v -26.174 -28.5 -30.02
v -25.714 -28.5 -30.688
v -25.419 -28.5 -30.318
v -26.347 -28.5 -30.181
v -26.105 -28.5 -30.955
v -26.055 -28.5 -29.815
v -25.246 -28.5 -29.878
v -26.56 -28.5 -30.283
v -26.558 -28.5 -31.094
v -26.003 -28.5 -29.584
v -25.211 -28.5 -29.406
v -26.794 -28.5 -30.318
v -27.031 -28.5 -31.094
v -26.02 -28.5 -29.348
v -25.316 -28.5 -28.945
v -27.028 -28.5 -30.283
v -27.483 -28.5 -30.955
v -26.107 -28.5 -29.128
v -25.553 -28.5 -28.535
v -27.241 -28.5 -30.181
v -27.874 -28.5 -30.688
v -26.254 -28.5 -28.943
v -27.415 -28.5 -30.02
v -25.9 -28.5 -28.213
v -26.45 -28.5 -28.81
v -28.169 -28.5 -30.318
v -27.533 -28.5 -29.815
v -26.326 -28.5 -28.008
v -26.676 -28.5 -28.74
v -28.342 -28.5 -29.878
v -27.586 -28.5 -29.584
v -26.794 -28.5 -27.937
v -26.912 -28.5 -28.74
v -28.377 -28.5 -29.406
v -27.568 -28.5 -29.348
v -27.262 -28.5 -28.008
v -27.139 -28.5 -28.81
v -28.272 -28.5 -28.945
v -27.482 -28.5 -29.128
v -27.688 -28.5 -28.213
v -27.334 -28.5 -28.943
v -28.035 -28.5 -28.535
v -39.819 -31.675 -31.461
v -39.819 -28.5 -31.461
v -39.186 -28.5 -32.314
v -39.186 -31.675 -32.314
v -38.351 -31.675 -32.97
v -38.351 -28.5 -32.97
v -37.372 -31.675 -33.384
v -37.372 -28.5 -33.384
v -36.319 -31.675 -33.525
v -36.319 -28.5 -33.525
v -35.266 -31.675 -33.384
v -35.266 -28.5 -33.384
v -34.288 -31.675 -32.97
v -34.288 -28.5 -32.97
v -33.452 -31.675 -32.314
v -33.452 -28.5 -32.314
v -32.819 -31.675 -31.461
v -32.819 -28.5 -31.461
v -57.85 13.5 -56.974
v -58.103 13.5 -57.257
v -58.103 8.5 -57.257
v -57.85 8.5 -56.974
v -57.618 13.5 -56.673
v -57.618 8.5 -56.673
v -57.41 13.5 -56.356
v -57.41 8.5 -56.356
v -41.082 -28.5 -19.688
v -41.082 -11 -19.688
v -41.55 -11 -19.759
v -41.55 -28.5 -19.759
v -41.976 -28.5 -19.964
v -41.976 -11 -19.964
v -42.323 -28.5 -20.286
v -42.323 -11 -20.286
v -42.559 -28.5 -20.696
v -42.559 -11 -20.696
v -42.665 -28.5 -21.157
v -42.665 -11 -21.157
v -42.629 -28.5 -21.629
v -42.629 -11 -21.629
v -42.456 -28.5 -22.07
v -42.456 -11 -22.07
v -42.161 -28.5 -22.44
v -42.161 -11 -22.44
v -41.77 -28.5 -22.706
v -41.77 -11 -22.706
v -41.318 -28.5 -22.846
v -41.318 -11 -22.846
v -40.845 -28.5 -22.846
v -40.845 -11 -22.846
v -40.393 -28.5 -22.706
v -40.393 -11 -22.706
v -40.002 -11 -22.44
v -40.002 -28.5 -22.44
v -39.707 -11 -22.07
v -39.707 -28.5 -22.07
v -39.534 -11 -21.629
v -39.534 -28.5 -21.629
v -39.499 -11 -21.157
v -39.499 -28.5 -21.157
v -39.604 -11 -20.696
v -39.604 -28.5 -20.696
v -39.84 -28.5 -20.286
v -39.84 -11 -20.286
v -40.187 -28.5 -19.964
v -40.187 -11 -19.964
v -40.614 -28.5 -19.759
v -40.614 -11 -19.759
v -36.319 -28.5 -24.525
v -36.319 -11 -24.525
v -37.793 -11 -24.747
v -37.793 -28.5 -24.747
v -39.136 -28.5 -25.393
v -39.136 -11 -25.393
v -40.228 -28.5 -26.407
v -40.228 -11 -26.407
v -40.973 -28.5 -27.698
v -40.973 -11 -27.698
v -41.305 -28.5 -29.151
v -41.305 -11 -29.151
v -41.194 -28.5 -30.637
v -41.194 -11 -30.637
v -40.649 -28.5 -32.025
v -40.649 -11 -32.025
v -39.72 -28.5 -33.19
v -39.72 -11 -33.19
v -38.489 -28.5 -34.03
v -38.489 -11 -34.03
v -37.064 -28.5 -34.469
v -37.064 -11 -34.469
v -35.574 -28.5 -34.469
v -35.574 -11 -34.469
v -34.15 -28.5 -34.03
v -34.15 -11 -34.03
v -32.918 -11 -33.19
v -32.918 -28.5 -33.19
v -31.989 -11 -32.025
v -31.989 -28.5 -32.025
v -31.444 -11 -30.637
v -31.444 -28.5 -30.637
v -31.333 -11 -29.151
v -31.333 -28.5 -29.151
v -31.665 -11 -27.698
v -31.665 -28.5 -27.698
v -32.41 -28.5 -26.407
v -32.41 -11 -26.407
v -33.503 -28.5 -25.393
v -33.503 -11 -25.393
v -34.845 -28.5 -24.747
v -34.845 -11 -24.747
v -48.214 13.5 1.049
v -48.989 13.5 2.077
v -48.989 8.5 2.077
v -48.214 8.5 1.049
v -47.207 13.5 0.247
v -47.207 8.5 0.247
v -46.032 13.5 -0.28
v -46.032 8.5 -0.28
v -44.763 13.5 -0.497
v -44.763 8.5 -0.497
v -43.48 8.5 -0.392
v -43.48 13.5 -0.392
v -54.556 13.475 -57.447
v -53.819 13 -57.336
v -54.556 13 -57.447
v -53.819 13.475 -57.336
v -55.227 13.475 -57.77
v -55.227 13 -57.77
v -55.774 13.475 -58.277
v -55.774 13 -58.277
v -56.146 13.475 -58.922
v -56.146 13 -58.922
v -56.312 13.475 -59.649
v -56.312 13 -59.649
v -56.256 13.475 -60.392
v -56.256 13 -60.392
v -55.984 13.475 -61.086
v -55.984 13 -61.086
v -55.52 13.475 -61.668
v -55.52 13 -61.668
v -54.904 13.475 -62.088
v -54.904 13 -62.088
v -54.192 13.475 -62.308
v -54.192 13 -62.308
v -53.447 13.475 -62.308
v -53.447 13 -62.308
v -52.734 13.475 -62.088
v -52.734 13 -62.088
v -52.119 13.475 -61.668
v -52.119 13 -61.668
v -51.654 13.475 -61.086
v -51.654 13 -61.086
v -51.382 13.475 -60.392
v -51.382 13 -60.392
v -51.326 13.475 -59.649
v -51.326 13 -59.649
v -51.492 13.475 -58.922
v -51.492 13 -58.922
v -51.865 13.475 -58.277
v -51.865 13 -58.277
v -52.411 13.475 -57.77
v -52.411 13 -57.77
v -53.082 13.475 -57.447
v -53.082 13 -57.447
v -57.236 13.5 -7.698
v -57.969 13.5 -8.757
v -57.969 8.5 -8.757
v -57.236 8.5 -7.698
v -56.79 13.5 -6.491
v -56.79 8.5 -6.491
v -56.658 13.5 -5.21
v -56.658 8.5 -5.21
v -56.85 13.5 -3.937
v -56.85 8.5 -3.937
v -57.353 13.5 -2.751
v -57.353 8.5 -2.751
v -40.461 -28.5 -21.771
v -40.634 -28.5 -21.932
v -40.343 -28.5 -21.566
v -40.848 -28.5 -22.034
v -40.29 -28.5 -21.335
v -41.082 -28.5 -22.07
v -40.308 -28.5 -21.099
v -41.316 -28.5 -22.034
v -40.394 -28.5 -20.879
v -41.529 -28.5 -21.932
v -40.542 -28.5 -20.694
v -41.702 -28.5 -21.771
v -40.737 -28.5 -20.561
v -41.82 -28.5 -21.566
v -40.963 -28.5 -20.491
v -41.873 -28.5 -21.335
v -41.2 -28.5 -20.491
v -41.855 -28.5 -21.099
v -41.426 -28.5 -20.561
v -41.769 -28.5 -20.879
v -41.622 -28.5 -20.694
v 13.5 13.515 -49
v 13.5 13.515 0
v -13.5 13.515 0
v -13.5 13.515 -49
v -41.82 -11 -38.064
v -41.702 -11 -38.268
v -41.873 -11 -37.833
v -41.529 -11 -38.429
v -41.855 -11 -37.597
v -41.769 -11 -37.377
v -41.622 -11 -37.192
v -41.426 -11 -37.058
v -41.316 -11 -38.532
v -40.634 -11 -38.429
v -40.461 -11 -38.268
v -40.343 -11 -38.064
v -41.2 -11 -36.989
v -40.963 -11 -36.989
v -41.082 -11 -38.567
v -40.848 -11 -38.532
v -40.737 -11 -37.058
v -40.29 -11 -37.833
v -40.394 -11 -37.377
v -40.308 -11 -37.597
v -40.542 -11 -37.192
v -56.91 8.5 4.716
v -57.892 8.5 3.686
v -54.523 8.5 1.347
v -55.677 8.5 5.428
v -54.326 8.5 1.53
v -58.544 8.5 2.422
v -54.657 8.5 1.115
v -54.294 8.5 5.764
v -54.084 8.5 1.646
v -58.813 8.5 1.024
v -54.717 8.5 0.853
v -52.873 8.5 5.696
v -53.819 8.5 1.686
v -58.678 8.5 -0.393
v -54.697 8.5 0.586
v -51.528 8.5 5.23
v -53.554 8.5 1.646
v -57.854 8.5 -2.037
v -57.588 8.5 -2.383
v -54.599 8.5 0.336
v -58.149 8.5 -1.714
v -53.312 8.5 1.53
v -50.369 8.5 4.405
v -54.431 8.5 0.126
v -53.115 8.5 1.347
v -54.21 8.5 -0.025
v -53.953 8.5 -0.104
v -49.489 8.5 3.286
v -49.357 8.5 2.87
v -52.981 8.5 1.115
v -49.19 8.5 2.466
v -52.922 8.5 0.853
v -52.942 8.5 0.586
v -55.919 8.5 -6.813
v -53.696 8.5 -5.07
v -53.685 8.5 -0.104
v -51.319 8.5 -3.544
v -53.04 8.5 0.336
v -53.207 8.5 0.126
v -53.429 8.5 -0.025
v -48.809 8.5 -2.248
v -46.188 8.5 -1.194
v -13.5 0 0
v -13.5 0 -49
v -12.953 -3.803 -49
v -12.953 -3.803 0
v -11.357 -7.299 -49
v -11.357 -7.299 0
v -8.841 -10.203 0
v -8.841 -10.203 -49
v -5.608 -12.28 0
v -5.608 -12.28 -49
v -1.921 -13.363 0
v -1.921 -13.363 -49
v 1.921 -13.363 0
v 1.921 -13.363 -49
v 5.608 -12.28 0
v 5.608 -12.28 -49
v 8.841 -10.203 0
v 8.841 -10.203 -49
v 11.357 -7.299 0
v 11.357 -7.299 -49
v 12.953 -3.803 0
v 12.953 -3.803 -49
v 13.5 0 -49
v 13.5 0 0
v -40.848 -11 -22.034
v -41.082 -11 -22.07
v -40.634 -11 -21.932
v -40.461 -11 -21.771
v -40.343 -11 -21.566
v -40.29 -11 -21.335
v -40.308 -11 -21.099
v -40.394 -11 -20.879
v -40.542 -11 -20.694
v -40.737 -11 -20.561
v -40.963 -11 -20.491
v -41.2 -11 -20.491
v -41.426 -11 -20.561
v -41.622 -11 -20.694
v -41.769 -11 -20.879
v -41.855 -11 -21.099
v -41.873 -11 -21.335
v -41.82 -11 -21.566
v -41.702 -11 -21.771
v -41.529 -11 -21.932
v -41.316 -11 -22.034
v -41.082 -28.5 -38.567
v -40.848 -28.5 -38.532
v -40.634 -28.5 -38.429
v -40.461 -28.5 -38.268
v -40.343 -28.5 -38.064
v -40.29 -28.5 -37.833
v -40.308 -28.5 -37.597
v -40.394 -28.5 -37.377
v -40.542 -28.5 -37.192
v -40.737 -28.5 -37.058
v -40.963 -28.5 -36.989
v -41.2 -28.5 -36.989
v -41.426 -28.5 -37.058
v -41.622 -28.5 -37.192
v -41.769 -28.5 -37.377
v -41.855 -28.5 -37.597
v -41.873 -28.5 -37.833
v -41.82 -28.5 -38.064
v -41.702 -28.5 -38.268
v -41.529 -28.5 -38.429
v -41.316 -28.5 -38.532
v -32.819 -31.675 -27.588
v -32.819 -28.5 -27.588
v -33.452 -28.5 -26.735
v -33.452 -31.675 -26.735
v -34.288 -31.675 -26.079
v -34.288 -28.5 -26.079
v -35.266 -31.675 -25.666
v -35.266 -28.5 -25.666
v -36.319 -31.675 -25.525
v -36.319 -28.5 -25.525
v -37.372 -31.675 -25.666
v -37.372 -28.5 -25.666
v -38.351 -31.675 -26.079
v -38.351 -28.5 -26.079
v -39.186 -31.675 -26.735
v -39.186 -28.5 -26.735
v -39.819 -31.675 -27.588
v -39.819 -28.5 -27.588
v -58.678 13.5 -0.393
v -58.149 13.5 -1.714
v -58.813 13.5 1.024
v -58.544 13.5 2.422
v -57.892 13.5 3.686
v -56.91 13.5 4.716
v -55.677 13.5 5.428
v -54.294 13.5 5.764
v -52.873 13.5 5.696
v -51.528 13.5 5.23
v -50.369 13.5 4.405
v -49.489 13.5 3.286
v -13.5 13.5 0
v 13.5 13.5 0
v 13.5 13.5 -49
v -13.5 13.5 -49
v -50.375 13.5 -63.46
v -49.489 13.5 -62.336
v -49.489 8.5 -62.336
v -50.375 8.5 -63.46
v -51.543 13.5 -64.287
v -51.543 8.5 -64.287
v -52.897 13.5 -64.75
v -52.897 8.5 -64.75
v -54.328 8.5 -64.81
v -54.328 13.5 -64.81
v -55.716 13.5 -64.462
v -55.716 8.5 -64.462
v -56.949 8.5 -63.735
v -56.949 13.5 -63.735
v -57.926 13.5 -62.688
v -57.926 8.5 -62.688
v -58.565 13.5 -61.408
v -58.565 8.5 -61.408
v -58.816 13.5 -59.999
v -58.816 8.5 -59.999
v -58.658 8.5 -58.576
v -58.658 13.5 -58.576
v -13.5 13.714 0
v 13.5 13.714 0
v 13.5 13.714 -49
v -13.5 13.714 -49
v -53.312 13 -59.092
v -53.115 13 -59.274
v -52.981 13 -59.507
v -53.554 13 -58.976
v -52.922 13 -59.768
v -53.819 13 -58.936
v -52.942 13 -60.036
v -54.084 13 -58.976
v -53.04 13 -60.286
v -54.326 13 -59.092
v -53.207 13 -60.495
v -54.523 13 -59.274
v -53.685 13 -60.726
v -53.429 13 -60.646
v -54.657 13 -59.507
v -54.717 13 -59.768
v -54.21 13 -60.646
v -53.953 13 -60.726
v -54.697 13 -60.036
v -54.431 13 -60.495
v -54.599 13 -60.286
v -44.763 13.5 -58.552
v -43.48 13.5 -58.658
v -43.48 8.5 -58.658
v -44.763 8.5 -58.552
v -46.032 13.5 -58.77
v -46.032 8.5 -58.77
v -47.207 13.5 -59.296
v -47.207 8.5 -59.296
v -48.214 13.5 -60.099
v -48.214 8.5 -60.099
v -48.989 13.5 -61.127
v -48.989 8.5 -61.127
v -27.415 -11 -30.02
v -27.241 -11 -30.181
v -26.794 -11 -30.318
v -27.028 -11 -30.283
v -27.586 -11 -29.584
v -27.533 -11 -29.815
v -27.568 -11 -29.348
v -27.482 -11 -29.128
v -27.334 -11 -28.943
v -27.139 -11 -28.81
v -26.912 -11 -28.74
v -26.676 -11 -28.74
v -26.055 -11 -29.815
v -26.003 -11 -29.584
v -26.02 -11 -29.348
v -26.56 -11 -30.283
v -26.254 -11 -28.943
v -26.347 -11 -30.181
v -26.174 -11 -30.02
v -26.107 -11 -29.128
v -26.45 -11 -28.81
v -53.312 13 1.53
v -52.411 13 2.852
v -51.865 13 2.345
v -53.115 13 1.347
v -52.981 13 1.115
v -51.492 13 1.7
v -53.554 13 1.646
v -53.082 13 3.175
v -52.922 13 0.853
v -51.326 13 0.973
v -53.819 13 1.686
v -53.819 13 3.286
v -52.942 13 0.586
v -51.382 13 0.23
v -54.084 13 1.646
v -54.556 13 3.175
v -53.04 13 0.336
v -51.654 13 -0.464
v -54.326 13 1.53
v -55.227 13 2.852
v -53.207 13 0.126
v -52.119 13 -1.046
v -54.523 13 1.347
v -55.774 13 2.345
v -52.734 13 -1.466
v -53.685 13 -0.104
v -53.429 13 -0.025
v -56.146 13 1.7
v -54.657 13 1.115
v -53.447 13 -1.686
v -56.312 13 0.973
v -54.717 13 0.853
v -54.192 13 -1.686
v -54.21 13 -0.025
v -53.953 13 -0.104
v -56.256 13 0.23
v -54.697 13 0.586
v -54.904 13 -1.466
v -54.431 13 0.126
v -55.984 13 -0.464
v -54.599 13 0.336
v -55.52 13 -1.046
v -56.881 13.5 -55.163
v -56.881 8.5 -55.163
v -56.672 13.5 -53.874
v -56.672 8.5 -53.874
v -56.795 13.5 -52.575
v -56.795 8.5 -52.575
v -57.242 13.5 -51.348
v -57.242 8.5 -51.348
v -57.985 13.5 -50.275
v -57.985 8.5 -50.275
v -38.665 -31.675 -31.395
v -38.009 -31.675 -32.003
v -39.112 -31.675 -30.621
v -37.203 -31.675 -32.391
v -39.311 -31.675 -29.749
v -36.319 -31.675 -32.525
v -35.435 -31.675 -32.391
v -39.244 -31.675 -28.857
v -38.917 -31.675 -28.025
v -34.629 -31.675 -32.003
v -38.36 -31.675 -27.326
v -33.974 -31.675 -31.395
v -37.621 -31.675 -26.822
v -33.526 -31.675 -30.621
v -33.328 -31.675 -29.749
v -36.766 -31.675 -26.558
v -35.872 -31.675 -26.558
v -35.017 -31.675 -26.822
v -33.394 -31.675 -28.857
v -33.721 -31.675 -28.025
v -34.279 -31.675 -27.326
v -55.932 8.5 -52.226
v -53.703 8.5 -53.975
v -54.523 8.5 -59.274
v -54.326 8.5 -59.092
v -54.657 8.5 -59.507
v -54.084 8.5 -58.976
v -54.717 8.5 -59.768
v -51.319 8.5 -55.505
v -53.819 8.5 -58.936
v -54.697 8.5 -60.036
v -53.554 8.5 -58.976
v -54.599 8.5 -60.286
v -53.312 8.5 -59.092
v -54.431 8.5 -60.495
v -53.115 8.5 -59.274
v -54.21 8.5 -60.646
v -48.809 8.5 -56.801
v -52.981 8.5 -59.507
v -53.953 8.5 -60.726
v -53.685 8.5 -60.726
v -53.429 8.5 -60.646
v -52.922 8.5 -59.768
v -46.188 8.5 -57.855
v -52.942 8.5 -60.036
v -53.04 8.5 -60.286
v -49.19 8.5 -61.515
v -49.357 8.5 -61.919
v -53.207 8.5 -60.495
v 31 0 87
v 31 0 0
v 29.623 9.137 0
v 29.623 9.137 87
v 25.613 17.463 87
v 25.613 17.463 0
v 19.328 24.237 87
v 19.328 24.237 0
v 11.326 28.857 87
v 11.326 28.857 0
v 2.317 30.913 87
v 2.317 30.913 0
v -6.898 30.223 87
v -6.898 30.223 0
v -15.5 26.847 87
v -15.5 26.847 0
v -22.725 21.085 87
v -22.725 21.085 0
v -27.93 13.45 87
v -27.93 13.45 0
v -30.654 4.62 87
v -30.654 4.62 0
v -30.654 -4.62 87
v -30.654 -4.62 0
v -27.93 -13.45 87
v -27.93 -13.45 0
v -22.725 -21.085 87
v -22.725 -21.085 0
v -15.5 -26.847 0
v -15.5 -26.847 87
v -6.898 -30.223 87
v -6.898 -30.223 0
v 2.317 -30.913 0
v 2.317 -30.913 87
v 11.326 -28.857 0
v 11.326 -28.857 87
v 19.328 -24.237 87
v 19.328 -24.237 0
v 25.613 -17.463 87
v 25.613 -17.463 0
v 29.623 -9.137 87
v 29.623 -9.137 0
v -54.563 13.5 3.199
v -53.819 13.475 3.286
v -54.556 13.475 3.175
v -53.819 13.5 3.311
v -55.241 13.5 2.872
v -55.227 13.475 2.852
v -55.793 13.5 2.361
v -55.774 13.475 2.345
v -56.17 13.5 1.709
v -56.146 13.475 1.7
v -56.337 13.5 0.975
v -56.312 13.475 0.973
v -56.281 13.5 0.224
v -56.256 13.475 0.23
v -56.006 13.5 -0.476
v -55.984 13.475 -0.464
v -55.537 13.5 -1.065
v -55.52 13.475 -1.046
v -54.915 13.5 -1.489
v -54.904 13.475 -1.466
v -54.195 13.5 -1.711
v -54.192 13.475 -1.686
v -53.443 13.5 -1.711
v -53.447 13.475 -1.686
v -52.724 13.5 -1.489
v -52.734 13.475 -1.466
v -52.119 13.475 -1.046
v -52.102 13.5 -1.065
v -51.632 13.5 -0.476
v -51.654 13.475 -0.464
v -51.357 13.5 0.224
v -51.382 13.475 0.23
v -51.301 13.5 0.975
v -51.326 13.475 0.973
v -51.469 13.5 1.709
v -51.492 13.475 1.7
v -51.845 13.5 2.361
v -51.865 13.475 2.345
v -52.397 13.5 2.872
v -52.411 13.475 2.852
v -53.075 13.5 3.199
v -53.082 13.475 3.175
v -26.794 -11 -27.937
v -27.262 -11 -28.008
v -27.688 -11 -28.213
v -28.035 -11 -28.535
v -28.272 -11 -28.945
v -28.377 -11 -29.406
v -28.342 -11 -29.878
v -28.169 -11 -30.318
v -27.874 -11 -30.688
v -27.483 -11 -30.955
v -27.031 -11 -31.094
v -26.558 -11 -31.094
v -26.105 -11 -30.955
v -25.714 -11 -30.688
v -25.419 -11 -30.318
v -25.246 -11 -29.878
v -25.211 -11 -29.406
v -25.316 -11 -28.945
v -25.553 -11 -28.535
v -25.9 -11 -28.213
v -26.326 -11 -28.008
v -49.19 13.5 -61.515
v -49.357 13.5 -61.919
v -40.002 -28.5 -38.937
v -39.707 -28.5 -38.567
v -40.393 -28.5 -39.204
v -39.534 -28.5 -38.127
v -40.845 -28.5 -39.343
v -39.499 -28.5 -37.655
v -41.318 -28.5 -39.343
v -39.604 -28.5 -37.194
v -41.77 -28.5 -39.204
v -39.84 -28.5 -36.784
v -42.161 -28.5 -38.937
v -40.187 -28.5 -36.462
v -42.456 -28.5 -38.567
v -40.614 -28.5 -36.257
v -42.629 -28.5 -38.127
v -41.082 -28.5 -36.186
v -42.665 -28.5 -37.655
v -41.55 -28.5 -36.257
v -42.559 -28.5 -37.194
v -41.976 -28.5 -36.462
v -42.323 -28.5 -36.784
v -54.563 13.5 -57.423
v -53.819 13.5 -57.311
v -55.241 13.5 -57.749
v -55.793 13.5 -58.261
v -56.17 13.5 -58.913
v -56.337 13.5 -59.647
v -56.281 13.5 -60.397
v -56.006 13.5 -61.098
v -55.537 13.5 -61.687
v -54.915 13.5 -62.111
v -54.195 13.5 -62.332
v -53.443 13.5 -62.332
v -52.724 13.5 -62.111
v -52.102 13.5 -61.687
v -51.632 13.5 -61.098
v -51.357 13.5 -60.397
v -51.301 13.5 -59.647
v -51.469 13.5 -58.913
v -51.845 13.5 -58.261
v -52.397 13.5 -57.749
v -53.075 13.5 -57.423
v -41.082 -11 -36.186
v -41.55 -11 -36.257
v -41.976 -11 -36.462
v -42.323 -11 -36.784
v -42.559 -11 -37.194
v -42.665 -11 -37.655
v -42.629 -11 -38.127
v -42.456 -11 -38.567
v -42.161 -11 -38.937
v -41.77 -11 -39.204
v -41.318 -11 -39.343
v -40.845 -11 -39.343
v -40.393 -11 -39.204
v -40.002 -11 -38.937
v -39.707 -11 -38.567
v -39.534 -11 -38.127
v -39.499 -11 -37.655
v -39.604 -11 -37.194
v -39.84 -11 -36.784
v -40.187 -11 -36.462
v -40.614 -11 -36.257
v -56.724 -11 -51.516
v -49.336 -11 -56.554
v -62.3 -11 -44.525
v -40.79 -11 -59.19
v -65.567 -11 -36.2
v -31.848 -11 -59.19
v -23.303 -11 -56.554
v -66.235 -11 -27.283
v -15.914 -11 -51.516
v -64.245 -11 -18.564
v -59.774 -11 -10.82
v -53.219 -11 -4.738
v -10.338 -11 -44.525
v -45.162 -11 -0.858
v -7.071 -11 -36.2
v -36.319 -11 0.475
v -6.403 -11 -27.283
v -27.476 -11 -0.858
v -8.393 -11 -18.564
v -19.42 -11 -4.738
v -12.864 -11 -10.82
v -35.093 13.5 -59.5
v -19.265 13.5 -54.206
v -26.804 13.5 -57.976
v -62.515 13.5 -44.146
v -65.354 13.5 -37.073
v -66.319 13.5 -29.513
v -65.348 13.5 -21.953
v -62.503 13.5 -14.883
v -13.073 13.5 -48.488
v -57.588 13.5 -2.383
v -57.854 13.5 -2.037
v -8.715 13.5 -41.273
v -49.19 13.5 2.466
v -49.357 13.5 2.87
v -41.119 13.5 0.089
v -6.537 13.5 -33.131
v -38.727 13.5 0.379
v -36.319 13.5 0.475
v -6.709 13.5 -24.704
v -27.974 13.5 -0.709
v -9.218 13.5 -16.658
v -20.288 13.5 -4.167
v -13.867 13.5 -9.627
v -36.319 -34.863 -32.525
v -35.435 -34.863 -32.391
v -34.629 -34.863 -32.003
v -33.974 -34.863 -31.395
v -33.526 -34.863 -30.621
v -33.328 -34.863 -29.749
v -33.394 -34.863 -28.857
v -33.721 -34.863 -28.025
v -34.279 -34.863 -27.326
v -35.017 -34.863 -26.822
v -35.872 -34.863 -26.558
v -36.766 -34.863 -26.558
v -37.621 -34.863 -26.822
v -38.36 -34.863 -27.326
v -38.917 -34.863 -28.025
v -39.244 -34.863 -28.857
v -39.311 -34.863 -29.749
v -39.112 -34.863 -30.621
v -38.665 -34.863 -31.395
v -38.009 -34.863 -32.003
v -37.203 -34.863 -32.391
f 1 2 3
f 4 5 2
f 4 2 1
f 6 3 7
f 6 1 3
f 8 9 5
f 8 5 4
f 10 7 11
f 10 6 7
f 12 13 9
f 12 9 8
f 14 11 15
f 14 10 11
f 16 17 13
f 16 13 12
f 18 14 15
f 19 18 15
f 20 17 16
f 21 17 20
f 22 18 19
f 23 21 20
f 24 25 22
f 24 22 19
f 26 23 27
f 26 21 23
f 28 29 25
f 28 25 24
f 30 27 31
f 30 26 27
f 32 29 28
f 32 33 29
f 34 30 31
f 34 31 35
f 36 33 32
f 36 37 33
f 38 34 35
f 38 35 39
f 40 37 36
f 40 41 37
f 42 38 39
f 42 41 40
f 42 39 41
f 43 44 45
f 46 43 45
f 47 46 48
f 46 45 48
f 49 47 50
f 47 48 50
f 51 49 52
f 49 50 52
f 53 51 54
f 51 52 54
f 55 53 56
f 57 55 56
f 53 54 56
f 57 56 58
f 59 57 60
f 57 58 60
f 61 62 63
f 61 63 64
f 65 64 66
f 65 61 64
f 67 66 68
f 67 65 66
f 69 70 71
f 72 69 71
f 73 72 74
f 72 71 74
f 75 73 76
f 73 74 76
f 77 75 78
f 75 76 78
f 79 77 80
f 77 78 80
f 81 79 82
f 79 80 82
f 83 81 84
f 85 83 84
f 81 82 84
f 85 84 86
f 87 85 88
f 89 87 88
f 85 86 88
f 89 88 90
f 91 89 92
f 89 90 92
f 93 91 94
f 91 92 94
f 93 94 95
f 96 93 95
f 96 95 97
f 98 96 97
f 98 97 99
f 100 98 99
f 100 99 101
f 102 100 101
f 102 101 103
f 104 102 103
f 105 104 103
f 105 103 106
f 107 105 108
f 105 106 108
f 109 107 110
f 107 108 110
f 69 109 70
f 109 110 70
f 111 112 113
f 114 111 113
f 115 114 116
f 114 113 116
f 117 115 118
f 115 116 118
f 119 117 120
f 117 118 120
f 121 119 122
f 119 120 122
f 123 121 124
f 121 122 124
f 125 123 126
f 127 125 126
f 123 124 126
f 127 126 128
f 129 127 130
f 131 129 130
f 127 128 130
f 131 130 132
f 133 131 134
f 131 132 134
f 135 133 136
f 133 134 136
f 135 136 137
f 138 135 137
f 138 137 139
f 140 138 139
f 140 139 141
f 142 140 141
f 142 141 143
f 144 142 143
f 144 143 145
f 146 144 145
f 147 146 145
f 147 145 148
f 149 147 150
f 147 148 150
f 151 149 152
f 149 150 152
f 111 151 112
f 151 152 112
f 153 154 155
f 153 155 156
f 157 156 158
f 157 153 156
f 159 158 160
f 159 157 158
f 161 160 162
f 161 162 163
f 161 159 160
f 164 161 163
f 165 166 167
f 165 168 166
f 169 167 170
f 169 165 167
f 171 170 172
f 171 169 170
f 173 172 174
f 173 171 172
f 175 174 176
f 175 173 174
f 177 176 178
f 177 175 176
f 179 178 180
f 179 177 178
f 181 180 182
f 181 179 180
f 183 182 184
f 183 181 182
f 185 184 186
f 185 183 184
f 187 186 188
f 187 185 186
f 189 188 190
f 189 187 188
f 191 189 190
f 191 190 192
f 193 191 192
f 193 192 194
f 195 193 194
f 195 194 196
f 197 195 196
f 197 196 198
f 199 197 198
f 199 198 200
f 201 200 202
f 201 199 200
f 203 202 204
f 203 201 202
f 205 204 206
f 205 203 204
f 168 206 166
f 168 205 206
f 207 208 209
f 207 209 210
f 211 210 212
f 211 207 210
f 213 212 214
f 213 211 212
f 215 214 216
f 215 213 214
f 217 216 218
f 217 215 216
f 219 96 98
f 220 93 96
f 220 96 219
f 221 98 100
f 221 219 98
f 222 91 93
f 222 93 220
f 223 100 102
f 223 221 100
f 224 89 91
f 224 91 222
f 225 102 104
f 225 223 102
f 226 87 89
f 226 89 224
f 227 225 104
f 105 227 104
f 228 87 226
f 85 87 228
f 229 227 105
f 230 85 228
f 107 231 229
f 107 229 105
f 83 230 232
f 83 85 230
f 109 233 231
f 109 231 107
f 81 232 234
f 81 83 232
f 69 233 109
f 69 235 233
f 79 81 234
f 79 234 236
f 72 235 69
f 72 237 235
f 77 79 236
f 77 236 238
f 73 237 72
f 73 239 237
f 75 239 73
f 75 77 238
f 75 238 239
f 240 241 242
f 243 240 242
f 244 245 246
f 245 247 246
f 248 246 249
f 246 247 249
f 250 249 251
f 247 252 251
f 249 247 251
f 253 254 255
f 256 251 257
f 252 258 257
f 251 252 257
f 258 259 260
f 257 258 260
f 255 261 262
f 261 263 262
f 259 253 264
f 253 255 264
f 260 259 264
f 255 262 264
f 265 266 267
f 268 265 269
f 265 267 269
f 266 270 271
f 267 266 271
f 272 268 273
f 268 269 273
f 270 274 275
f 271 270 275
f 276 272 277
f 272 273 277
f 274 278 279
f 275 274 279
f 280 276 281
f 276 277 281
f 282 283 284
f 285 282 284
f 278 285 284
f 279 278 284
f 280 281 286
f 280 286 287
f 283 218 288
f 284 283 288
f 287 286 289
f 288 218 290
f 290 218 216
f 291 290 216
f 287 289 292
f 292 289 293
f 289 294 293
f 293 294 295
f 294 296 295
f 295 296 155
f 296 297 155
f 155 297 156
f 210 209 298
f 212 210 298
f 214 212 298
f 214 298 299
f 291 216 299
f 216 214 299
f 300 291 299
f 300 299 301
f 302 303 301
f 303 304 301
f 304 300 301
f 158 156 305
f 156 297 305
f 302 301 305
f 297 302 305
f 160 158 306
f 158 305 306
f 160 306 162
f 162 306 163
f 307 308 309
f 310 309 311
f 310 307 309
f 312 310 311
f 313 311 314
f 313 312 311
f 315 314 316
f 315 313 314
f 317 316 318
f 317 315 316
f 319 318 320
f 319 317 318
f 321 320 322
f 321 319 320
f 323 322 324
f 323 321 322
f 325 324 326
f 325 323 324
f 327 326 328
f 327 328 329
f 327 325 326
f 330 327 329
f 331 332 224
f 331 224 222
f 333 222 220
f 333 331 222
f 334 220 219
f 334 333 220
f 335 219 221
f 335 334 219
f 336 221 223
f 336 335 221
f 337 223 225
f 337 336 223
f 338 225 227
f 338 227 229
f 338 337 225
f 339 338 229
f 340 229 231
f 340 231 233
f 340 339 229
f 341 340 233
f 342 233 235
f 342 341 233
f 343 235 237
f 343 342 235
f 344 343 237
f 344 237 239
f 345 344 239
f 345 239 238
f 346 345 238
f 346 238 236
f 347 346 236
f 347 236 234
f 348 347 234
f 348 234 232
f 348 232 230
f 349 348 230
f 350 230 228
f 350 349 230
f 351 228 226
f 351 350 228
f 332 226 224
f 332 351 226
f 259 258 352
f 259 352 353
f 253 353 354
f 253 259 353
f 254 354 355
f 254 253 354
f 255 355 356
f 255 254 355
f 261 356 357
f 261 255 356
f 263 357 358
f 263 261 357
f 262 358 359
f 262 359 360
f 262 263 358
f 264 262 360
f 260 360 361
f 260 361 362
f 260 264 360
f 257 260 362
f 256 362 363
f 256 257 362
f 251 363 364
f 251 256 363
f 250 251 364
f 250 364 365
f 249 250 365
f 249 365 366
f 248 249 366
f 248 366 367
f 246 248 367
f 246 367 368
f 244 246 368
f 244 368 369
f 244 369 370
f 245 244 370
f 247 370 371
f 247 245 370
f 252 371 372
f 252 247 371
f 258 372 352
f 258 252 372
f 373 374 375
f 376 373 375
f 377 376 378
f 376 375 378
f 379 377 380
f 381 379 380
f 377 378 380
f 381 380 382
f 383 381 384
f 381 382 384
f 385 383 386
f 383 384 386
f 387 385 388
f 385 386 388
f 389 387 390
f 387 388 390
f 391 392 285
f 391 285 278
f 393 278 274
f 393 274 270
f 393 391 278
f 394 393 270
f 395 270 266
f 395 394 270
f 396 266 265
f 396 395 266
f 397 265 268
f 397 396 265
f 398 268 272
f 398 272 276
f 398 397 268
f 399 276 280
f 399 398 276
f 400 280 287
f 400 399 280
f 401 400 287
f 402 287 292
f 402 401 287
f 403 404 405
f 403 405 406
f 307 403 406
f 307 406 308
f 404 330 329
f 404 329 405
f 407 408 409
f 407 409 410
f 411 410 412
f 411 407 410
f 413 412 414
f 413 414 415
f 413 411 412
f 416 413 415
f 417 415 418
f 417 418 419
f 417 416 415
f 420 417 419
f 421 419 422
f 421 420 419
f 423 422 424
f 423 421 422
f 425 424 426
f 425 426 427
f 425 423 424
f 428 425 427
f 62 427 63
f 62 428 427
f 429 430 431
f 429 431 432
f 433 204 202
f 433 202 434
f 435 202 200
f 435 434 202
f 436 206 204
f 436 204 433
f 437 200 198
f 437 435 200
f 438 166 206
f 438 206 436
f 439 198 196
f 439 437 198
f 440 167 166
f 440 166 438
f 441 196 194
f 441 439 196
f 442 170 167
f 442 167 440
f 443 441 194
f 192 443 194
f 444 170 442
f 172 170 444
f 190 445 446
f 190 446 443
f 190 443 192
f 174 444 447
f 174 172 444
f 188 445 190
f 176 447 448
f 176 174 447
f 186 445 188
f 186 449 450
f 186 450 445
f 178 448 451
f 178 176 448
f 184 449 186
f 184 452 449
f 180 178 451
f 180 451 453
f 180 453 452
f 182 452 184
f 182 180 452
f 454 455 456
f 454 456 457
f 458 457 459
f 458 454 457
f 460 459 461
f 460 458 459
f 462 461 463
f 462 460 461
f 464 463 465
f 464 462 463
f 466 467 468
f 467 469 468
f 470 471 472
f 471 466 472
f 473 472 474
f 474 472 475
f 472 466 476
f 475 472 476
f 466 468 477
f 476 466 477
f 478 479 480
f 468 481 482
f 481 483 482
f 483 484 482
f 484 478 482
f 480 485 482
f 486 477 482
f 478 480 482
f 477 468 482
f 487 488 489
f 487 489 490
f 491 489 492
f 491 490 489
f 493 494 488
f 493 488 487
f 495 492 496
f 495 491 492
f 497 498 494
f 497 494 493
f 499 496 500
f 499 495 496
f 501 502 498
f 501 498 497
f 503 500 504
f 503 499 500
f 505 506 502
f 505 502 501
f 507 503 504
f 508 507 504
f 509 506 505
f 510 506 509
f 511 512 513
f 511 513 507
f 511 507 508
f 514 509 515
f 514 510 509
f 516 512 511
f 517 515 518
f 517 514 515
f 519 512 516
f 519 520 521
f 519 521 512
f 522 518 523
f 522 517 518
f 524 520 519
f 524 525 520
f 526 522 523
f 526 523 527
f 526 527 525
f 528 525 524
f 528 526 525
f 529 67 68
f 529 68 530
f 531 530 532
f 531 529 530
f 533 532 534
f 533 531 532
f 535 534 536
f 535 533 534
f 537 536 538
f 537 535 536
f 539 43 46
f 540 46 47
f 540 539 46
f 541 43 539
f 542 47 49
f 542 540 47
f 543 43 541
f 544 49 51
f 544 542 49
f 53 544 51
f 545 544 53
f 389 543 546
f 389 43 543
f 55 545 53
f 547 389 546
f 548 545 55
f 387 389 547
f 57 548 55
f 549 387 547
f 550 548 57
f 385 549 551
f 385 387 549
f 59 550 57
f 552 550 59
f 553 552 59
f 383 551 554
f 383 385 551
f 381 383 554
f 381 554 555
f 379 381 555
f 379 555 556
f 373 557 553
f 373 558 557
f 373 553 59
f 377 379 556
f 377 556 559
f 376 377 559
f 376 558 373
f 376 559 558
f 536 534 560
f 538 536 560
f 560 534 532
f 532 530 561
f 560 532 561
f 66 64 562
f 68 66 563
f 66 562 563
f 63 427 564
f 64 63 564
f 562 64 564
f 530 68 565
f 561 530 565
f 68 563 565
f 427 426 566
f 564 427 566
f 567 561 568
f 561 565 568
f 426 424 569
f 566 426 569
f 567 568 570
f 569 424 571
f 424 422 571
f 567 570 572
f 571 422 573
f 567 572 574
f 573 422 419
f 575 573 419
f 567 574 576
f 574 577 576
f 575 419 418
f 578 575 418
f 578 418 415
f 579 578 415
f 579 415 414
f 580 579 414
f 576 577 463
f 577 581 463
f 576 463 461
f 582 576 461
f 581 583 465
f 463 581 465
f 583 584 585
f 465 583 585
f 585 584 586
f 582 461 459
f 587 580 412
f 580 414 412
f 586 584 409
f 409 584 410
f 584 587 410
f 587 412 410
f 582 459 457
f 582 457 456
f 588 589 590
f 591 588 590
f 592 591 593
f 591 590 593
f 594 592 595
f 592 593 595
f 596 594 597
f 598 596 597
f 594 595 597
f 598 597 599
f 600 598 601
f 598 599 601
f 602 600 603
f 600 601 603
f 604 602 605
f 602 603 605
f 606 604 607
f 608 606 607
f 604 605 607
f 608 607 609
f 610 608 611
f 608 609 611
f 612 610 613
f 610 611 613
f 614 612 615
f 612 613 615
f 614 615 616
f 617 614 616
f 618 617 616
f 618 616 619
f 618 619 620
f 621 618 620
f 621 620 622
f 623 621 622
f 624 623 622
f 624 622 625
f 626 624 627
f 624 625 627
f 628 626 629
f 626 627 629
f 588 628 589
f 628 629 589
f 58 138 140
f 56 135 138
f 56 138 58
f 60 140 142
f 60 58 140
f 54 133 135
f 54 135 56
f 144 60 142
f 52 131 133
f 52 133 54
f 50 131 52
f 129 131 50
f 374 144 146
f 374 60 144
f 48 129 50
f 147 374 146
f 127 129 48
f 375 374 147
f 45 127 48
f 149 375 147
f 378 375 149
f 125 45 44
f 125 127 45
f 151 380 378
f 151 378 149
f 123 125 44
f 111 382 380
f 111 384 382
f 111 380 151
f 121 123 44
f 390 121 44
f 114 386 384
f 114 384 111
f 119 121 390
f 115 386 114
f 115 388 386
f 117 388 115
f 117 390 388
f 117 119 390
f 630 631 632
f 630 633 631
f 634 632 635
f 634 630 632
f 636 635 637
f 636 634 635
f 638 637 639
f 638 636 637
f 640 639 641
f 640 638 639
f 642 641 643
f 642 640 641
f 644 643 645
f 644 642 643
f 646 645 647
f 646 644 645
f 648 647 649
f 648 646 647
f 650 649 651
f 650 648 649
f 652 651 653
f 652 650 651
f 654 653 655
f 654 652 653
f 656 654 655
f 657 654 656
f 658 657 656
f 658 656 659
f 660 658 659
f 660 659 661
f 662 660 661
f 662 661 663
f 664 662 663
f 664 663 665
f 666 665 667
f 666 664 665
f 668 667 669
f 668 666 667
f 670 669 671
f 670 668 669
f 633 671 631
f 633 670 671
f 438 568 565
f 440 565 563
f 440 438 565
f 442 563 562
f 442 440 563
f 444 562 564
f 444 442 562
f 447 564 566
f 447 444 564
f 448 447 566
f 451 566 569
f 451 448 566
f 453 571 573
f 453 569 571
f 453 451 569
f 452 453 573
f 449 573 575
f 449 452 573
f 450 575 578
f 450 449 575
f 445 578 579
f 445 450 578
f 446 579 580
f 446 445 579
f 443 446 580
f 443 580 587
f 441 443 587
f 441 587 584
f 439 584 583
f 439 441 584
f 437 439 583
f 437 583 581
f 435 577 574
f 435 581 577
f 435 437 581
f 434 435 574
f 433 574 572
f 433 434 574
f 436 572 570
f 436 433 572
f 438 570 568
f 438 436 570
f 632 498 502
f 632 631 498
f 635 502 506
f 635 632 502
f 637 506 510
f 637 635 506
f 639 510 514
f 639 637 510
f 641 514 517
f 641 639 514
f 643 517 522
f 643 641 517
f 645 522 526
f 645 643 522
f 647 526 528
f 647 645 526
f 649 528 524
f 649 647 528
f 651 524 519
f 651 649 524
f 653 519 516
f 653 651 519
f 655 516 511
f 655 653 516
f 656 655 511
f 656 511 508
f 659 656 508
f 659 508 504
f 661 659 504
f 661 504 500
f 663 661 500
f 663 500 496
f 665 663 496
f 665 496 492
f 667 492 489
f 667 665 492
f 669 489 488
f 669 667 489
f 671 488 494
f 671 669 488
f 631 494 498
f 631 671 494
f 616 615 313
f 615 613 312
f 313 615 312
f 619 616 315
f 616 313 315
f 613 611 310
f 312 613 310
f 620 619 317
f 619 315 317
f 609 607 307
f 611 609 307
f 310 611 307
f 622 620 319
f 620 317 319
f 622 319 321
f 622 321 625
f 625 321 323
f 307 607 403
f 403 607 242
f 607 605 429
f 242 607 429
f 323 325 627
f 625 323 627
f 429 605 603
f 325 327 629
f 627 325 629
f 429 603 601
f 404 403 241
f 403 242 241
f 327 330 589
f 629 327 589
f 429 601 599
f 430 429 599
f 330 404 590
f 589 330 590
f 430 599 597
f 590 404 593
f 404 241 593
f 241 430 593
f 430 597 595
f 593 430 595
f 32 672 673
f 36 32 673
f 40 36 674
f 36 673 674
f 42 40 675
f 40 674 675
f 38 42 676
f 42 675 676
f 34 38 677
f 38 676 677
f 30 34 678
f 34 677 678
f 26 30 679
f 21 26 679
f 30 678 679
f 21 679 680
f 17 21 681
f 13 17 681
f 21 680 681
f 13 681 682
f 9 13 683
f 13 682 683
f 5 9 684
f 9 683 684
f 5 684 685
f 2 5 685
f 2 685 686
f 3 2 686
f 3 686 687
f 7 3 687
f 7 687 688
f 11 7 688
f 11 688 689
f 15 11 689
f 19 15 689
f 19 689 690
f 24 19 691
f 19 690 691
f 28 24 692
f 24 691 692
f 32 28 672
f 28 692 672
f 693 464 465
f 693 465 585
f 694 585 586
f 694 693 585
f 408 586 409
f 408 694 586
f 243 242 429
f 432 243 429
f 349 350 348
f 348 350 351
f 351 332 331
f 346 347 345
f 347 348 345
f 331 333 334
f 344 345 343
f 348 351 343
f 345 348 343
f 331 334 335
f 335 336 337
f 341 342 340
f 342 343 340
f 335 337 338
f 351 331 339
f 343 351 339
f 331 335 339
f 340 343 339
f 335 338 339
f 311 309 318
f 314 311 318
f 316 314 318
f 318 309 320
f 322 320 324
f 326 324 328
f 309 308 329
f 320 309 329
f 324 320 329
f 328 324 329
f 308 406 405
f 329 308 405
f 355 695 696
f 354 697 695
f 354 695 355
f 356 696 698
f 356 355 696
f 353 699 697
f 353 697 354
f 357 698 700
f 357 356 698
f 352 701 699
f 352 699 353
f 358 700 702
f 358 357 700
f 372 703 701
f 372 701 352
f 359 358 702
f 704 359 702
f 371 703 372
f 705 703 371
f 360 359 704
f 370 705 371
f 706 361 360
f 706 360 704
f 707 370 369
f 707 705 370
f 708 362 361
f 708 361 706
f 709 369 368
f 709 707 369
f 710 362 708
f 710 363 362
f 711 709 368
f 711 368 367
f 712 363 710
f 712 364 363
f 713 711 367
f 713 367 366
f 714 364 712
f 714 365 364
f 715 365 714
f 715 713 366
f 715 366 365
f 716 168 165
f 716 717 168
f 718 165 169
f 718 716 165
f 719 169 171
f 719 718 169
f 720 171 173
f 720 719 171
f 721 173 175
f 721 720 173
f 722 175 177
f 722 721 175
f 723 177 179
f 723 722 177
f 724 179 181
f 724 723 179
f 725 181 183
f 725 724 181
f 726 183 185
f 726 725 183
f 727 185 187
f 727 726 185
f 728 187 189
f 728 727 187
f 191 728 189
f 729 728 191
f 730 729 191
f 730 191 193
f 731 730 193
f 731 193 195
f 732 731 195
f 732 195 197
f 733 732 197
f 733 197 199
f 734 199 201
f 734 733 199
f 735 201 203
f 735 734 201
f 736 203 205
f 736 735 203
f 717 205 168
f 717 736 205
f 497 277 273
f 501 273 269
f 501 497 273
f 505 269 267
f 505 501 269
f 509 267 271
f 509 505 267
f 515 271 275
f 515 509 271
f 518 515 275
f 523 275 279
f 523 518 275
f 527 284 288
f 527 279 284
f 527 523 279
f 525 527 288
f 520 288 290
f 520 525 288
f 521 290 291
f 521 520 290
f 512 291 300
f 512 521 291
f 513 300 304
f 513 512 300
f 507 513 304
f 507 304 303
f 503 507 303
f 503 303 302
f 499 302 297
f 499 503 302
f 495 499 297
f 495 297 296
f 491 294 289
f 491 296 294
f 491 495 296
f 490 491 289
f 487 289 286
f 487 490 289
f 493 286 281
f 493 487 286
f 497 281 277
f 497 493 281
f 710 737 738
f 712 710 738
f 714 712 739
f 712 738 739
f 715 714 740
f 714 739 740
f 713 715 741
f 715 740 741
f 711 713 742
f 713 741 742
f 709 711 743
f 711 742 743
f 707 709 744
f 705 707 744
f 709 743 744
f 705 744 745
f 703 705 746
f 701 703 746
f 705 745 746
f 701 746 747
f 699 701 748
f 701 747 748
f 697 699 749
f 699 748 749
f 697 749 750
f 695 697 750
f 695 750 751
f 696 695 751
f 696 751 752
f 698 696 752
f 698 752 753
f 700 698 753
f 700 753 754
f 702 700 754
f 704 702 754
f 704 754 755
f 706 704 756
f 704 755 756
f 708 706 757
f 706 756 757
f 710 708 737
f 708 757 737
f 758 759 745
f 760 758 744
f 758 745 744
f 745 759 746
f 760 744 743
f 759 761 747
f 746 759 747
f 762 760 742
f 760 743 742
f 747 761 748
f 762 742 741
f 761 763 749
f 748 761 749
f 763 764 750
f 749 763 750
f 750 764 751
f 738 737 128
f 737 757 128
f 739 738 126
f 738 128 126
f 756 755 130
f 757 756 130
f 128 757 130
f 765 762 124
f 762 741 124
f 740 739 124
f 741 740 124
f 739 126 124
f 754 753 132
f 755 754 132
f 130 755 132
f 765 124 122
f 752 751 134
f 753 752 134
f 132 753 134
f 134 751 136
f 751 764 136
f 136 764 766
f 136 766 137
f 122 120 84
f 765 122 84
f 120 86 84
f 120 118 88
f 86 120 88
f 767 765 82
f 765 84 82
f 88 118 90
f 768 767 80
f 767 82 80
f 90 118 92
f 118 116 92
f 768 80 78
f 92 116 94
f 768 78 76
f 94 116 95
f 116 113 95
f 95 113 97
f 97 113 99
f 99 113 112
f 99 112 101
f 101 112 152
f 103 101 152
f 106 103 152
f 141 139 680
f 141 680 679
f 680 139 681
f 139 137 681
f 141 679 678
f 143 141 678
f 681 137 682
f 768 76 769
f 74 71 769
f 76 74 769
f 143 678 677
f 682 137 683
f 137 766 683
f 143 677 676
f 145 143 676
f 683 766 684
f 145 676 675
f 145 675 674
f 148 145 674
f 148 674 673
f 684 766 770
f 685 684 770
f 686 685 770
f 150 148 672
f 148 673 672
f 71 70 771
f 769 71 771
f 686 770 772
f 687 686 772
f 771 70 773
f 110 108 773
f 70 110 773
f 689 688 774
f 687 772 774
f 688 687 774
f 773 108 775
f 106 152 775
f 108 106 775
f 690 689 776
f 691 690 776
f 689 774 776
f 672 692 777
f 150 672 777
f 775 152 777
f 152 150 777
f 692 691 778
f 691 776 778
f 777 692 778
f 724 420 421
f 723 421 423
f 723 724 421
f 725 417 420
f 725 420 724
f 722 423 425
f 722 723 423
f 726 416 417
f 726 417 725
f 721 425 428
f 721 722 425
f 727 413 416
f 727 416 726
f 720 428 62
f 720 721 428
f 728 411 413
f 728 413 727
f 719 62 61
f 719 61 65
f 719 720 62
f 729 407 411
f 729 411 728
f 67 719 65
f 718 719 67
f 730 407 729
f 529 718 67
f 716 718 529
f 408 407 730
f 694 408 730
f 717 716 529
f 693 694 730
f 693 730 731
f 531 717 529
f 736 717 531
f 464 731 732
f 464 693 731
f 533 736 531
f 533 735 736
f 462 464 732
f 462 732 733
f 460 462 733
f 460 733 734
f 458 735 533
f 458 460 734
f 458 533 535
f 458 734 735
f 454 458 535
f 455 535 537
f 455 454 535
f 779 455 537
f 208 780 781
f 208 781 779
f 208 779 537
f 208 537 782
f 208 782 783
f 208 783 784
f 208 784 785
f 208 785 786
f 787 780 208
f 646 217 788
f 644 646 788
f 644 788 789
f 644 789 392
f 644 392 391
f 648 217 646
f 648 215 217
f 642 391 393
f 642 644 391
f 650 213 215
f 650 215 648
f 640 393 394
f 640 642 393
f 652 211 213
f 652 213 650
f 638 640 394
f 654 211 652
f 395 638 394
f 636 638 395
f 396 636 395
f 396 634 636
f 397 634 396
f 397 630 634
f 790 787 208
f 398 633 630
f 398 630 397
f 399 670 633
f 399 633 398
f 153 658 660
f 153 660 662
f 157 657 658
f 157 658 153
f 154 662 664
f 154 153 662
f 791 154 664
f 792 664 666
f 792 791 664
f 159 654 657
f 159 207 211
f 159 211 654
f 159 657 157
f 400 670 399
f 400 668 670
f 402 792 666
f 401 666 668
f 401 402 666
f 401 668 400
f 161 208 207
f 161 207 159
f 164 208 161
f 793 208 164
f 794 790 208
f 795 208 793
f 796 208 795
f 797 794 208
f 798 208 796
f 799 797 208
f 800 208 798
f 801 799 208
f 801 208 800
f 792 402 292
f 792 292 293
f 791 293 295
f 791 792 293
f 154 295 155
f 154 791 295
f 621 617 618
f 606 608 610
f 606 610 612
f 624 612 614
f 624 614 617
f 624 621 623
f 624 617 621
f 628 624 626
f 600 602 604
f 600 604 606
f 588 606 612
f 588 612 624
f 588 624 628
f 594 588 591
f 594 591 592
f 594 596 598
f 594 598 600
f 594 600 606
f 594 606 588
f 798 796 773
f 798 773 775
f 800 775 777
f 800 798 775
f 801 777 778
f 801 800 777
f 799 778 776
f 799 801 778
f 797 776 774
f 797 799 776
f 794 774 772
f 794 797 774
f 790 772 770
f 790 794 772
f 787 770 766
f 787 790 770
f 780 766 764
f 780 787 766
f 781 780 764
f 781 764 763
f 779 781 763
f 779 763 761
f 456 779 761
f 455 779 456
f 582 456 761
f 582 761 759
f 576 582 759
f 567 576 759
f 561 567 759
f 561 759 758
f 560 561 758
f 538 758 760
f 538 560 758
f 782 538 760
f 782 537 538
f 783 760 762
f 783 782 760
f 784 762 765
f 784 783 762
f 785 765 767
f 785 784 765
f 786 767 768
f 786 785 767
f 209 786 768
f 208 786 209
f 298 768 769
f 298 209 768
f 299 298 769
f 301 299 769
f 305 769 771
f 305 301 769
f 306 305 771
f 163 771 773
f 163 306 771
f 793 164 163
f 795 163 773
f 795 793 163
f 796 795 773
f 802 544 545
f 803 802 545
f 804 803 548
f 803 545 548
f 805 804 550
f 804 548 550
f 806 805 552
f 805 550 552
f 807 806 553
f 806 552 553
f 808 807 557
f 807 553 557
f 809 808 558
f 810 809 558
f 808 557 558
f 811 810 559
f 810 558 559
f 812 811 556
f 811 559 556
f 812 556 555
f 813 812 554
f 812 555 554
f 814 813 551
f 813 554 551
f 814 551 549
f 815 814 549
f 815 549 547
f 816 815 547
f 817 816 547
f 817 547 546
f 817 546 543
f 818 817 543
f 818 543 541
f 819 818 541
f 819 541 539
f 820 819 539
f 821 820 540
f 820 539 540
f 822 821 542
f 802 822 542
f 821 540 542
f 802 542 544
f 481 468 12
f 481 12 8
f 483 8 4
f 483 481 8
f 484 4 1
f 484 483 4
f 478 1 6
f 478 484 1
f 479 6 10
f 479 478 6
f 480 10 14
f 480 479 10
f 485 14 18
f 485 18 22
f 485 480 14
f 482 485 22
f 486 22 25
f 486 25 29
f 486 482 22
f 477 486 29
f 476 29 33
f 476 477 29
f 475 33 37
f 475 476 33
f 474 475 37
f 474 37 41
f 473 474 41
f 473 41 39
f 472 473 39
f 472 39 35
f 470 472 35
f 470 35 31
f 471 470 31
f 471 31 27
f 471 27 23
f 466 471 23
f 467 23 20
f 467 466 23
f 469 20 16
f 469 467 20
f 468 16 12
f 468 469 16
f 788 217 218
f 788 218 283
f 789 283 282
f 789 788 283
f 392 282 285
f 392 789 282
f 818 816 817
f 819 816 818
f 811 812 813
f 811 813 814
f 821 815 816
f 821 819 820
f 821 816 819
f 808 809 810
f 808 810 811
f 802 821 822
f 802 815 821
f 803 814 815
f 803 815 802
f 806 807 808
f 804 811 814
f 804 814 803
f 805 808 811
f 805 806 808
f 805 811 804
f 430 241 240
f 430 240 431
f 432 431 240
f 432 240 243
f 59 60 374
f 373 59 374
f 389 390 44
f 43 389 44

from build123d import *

# Parameters (mm, degrees)
SKETCH1_R                                    = 31
BOSS_EXTRUDE1_DEPTH                          = 87
BOSS_EXTRUDE2_DEPTH                          = 49
SKETCH4_R                                    = 30
BOSS_EXTRUDE35_DEPTH                         = 24.5
SKETCH12_R                                   = 1.5875
SKETCH12_R_2                                 = 0.79375
BOSS_EXTRUDE36_DEPTH                         = 17.5
SKETCH14_R                                   = 5
BOSS_EXTRUDE37_DEPTH                         = 17.5
BOSS_EXTRUDE38_DEPTH                         = 3.175
SKETCH17_R                                   = 3
BOSS_EXTRUDE39_DEPTH                         = 3.188
BOSS_EXTRUDE40_DEPTH                         = 5
CBORE_FOR_M1_6_HEXAGON_HEAD_BOLTS_FU_2_COUNT = 2
CBORE_FOR_M1_6_HEXAGON_HEAD_BOLTS_FU_2_PITCH = 60.621778265
SKETCH23_W                                   = 27
SKETCH23_H                                   = 0.198523496
BOSS_EXTRUDE44_DEPTH                         = 49


with BuildPart() as part:
    # Sketch1 → Boss-Extrude1 (new body)
    with BuildSketch(Plane.XY):
        Circle(SKETCH1_R)
    extrude(amount=BOSS_EXTRUDE1_DEPTH)

    # Sketch2 → Boss-Extrude2 (add)
    with BuildSketch(Plane.XY):
        with BuildLine():
            Line((-2.6e-08, 13.5), (-13.5, 13.5))
            Line((-13.5, 13.5), (-13.5, 0))
            ThreePointArc((-13.5, 0), (-9.545941555, 9.545941537), (-2.6e-08, 13.5))
        make_face()
        with BuildLine():
            Line((13.5, 13.5), (-2.6e-08, 13.5))
            ThreePointArc((-2.6e-08, 13.5), (9.545941537, 9.545941555), (13.5, 0))
            Line((13.5, 0), (13.5, 13.5))
        make_face()
        with BuildLine():
            ThreePointArc((13.5, 0), (9.545941537, 9.545941555), (-2.6e-08, 13.5))
            ThreePointArc((-2.6e-08, 13.5), (-9.545941555, 9.545941537), (-13.5, 0))
            Line((-13.5, 0), (13.5, 0))
        make_face()
        with BuildLine():
            Line((13.5, 0), (-13.5, 0))
            ThreePointArc((-13.5, 0), (0, -13.5), (13.5, 0))
        make_face()
    extrude(amount=-BOSS_EXTRUDE2_DEPTH)

    # Sketch23 → Boss-Extrude44 (add)
    with BuildSketch(Plane(origin=(0, 0, 0), x_dir=(-1, 0, 0), z_dir=(0, 0, -1))):
        with Locations((0, 13.614545632)):
            Rectangle(SKETCH23_W, SKETCH23_H)
    extrude(amount=BOSS_EXTRUDE44_DEPTH)


with BuildPart() as body_2:
    # Sketch4 → Boss-Extrude35 (new body)
    with BuildSketch(Plane(origin=(0, 13.5, 0), x_dir=(1, 0, 0), z_dir=(0, 1, 0))):
        with Locations(Location((-36.319116719, 29.524684542, 0), (0, 0, 270))):
            Circle(SKETCH4_R)
    extrude(amount=-BOSS_EXTRUDE35_DEPTH)

    # Sketch12 → Boss-Extrude36 (add)
    # profile 1 of 3: a face of its own
    with BuildSketch(Plane.XZ.offset(11)):
        with Locations(Location((-41.081616719, -21.275792571, 0), (0, 0, 90))):
            Circle(SKETCH12_R)
        with Locations(Location((-41.081616719, -21.275792571, 0), (0, 0, 270))):
            Circle(SKETCH12_R_2, mode=Mode.SUBTRACT)
    # profile 2 of 3: a face of its own
    with BuildSketch(Plane.XZ.offset(11)):
        with Locations(Location((-26.794116719, -29.524684542, 0), (0, 0, 90))):
            Circle(SKETCH12_R)
        with Locations(Location((-26.794116719, -29.524684542, 0), (0, 0, 270))):
            Circle(SKETCH12_R_2, mode=Mode.SUBTRACT)
    # profile 3 of 3: a face of its own
    with BuildSketch(Plane.XZ.offset(11)):
        with Locations(Location((-41.081616719, -37.773576513, 0), (0, 0, 90))):
            Circle(SKETCH12_R)
        with Locations(Location((-41.081616719, -37.773576513, 0), (0, 0, 270))):
            Circle(SKETCH12_R_2, mode=Mode.SUBTRACT)
    extrude(amount=BOSS_EXTRUDE36_DEPTH)

    # Sketch14 → Boss-Extrude37 (add)
    with BuildSketch(Plane.XZ.offset(11)):
        with Locations(Location((-36.319116719, -29.524684542, 0), (0, 0, 90))):
            Circle(SKETCH14_R)
    extrude(amount=BOSS_EXTRUDE37_DEPTH)

    # Sketch16 → Boss-Extrude38 (add)
    with BuildSketch(Plane.XZ.offset(28.5)):
        with BuildLine():
            Line((-39.819112112, -27.588184542), (-39.819112112, -31.461184542))
            ThreePointArc((-39.819112112, -31.461184542), (-36.319116719, -33.524684542), (-32.819121326, -31.461184542))
            Line((-32.819121326, -31.461184542), (-32.819121326, -27.588184542))
            ThreePointArc((-32.819121326, -27.588184542), (-36.319116719, -25.524684542), (-39.819112112, -27.588184542))
        make_face()
    extrude(amount=BOSS_EXTRUDE38_DEPTH)

    # Sketch17 → Boss-Extrude39 (add)
    with BuildSketch(Plane.XZ.offset(31.675)):
        with Locations(Location((-36.319116719, -29.524684542, 0), (0, 0, 270))):
            Circle(SKETCH17_R)
    extrude(amount=BOSS_EXTRUDE39_DEPTH)

    # Sketch4<14> → Boss-Extrude40 (add)
    with BuildSketch(Plane(origin=(0, 13.5, 0), x_dir=(1, 0, 0), z_dir=(0, 1, 0))):
        with BuildLine():
            ThreePointArc((-57.409928714, 56.356195969), (-54.510789615, 54.883645908), (-51.319116839, 55.505446587))
            ThreePointArc((-51.319116839, 55.505446587), (-49.488989735, 57.335573615), (-48.819116719, 59.835573675))
            ThreePointArc((-48.819116719, 59.835573675), (-48.86169446, 60.486699273), (-48.988702537, 61.126735489))
            ThreePointArc((-48.988702537, 61.126735489), (-49.277543837, 61.715139228), (-49.4889897, 62.335573675))
            ThreePointArc((-49.4889897, 62.335573675), (-56.358669983, 64.142622458), (-58.102725979, 57.25668017))
            ThreePointArc((-58.102725979, 57.25668017), (-57.731278879, 56.825709379), (-57.409928714, 56.356195969))
        make_face()
        with BuildLine():
            ThreePointArc((-57.985399102, 50.274918462), (-54.837855182, 53.126725254), (-51.319116839, 55.505446587))
            ThreePointArc((-51.319116839, 55.505446587), (-54.510789615, 54.883645908), (-57.409928714, 56.356195969))
            ThreePointArc((-57.409928714, 56.356195969), (-56.691759054, 53.220368588), (-57.985399102, 50.274918462))
        make_face()
        with BuildLine():
            ThreePointArc((-51.319116839, 55.505446587), (-47.510939371, 57.358892017), (-43.479702964, 58.657586983))
            ThreePointArc((-43.479702964, 58.657586983), (-46.635919955, 58.995876585), (-48.988702537, 61.126735489))
            ThreePointArc((-48.988702537, 61.126735489), (-48.86169446, 60.486699273), (-48.819116719, 59.835573675))
            ThreePointArc((-48.819116719, 59.835573675), (-49.488989735, 57.335573615), (-51.319116839, 55.505446587))
        make_face()
        with BuildLine():
            ThreePointArc((-48.819116719, -0.78620459), (-49.488989743, 1.713795484), (-51.319116868, 3.543922515))
            ThreePointArc((-51.319116868, 3.543922515), (-54.470242402, 4.171217658), (-57.352502741, 2.751475895))
            ThreePointArc((-57.352502741, 2.751475895), (-57.717654677, 2.207130123), (-58.149243738, 1.71379541))
            ThreePointArc((-58.149243738, 1.71379541), (-56.319116719, -5.116331609), (-49.4889897, -3.28620459))
            ThreePointArc((-49.4889897, -3.28620459), (-49.277543837, -2.665770143), (-48.988702537, -2.077366404))
            ThreePointArc((-48.988702537, -2.077366404), (-48.86169446, -1.437330188), (-48.819116719, -0.78620459))
        make_face()
        with BuildLine():
            ThreePointArc((-48.988702537, -2.077366404), (-46.635919955, 0.0534925), (-43.479702964, 0.391782102))
            ThreePointArc((-43.479702964, 0.391782102), (-47.510939387, 1.690477074), (-51.319116868, 3.543922515))
            ThreePointArc((-51.319116868, 3.543922515), (-49.488989743, 1.713795484), (-48.819116719, -0.78620459))
            ThreePointArc((-48.819116719, -0.78620459), (-48.86169446, -1.437330188), (-48.988702537, -2.077366404))
        make_face()
        with BuildLine():
            ThreePointArc((-57.352502741, 2.751475895), (-54.470242402, 4.171217658), (-51.319116868, 3.543922515))
            ThreePointArc((-51.319116868, 3.543922515), (-54.828336282, 5.91517817), (-57.968657196, 8.756983728))
            ThreePointArc((-57.968657196, 8.756983728), (-56.68351609, 5.854474833), (-57.352502741, 2.751475895))
        make_face()
    extrude(amount=-BOSS_EXTRUDE40_DEPTH)

    # Sketch21 → CBORE for M1.6 Hexagon head bolts-Full thread-grades AB1 (revolve, cut)
    with BuildSketch(Plane(origin=(-53.819116719, 13.5, -59.835573675), x_dir=(0, 0, 1), z_dir=(1, 0, 0))):
        Polygon((0, 0), (0, 5.001), (0.9, 5.001), (0.9, 0.5), (2.5, 0.5), (2.5, 0.025), (2.525, 0), align=None)
    cbore_for_m1_6_hexagon_head_bolts_full_t = revolve(axis=Axis((-53.819116719, 19.85, -59.835573675), (0, -1, 0)), mode=Mode.SUBTRACT)

    # CBORE for M1.6 Hexagon head bolts-Fu 2: CBORE for M1.6 Hexagon head bolts-Full thread-grades AB1 ×2
    with Locations(*[(0, 0, i * CBORE_FOR_M1_6_HEXAGON_HEAD_BOLTS_FU_2_PITCH) for i in range(1, CBORE_FOR_M1_6_HEXAGON_HEAD_BOLTS_FU_2_COUNT)]):
        add(cbore_for_m1_6_hexagon_head_bolts_full_t, mode=Mode.SUBTRACT)


solid = Compound([part.part, body_2.part])
